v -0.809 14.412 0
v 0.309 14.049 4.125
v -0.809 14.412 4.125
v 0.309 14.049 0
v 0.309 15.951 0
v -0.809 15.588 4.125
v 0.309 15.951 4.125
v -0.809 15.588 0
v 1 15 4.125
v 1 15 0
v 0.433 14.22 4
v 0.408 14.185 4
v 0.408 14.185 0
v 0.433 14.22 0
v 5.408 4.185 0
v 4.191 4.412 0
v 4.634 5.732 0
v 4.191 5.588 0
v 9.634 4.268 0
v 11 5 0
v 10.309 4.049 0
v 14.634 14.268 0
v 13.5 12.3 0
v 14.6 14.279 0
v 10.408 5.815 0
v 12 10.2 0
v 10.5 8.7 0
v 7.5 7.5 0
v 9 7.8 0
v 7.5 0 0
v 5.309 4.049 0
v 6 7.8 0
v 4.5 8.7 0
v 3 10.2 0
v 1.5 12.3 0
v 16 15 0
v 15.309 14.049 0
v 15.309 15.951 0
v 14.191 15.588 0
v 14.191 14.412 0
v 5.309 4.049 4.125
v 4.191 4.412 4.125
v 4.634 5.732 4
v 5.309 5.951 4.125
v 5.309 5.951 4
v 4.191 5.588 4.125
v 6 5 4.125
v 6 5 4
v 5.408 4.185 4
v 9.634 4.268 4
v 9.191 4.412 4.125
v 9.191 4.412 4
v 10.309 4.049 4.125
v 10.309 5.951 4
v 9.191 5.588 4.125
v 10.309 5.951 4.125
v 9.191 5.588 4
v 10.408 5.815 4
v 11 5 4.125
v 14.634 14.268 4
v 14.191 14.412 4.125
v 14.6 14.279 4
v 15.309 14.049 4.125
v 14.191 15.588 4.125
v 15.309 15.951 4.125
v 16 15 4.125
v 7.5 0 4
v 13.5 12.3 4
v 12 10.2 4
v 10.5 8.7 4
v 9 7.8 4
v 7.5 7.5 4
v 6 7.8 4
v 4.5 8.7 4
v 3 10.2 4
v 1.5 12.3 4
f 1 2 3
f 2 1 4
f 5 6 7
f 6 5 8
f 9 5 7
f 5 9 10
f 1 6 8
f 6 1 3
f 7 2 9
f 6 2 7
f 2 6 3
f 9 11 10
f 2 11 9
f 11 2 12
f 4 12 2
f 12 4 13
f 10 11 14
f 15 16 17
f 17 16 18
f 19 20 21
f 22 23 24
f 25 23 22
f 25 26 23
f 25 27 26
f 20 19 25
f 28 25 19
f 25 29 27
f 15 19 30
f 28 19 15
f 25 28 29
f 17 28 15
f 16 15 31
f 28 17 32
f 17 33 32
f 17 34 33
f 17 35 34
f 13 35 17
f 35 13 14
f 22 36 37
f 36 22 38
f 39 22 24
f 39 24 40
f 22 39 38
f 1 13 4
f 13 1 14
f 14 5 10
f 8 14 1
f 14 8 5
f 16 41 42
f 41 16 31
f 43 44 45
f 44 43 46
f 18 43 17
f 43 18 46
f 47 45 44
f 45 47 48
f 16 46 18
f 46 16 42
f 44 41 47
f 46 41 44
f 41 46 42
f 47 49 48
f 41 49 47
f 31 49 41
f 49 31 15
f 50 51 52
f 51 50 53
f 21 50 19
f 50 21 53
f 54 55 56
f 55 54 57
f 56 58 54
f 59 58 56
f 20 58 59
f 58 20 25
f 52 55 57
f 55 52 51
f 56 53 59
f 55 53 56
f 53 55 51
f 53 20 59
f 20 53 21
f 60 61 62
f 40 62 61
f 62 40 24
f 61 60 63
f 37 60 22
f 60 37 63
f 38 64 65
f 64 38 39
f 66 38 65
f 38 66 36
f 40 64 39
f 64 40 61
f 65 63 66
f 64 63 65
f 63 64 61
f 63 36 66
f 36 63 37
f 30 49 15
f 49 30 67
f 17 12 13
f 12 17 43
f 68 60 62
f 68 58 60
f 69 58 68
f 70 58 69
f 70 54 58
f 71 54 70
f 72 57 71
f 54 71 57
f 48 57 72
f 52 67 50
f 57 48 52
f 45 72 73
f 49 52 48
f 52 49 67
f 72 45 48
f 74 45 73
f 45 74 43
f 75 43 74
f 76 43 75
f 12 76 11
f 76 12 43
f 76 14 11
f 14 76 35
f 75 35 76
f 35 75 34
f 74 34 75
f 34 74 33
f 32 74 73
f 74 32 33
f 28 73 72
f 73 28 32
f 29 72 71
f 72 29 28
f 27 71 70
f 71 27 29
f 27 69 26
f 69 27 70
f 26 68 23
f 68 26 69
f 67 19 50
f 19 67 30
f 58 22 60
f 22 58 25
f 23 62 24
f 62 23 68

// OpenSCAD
joinfactor = 0.125;

gFocalPoint = [0,0];
gSteps = 10;
gHeight = 4;

BezQuadCurve( [[0, 15],[5,5],[10,5],[15,15]], [7.5,0], gSteps, gHeight);

function BEZ03(u) = pow((1-u), 3);
function BEZ13(u) = 3*u*(pow((1-u),2));
function BEZ23(u) = 3*(pow(u,2))*(1-u);
function BEZ33(u) = pow(u,3);

function PointAlongBez4(p0, p1, p2, p3, u) = [
	BEZ03(u)*p0[0]+BEZ13(u)*p1[0]+BEZ23(u)*p2[0]+BEZ33(u)*p3[0],
	BEZ03(u)*p0[1]+BEZ13(u)*p1[1]+BEZ23(u)*p2[1]+BEZ33(u)*p3[1]];


module BezQuadCurve(c, focalPoint, steps=gSteps, height=gHeight)
{
	
	for(point=[0:3])
	{
		translate(c[point])
		color([1,0,0])
		cylinder(r=1, h=height+joinfactor);
	}

	for(step = [steps:1])
	{
		linear_extrude(height = height, convexity = 10) 
		polygon(
			points=[
				focalPoint,
				PointAlongBez4(c[0], c[1], c[2],c[3], step/steps),
				PointAlongBez4(c[0], c[1], c[2],c[3], (step-1)/steps)],
			paths=[[0,1,2,0]]
		);
	}
}




module PlotBEZ0(steps)
{
	cubeSize = 1;
	cubeHeight = steps;

	for (step=[0:steps])
	{
		translate([cubeSize*step, 0, 0])
		cube(size=[cubeSize, cubeSize, BEZ03(step/steps)*cubeHeight]);
	}	
}

module PlotBEZ1(steps)
{
	cubeSize = 1;
	cubeHeight = steps;

	for (step=[0:steps])
	{
		translate([cubeSize*step, 0, 0])
		cube(size=[cubeSize, cubeSize, BEZ13(step/steps)*cubeHeight]);
	}	
}

module PlotBEZ2(steps)
{
	cubeSize = 1;
	cubeHeight = steps;

	for (step=[0:steps])
	{
		translate([cubeSize*step, 0, 0])
		cube(size=[cubeSize, cubeSize, BEZ23(step/steps)*cubeHeight]);
	}	
}

module PlotBEZ3(steps)
{
	cubeSize = 1;
	cubeHeight = steps;

	for (step=[0:steps])
	{
		translate([cubeSize*step, 0, 0])
		cube(size=[cubeSize, cubeSize, BEZ33(step/steps)*cubeHeight]);
	}	
}

module PlotBez4Blending()
{
	sizing = 100;

	translate([0, 0, sizing + 10])
	PlotBEZ0(100);

	translate([sizing+10, 0, sizing + 10])
	PlotBEZ1(100);

	translate([0, 0, 0])
	PlotBEZ2(100);

	translate([sizing+10, 0, 0])
	PlotBEZ3(100);
}
